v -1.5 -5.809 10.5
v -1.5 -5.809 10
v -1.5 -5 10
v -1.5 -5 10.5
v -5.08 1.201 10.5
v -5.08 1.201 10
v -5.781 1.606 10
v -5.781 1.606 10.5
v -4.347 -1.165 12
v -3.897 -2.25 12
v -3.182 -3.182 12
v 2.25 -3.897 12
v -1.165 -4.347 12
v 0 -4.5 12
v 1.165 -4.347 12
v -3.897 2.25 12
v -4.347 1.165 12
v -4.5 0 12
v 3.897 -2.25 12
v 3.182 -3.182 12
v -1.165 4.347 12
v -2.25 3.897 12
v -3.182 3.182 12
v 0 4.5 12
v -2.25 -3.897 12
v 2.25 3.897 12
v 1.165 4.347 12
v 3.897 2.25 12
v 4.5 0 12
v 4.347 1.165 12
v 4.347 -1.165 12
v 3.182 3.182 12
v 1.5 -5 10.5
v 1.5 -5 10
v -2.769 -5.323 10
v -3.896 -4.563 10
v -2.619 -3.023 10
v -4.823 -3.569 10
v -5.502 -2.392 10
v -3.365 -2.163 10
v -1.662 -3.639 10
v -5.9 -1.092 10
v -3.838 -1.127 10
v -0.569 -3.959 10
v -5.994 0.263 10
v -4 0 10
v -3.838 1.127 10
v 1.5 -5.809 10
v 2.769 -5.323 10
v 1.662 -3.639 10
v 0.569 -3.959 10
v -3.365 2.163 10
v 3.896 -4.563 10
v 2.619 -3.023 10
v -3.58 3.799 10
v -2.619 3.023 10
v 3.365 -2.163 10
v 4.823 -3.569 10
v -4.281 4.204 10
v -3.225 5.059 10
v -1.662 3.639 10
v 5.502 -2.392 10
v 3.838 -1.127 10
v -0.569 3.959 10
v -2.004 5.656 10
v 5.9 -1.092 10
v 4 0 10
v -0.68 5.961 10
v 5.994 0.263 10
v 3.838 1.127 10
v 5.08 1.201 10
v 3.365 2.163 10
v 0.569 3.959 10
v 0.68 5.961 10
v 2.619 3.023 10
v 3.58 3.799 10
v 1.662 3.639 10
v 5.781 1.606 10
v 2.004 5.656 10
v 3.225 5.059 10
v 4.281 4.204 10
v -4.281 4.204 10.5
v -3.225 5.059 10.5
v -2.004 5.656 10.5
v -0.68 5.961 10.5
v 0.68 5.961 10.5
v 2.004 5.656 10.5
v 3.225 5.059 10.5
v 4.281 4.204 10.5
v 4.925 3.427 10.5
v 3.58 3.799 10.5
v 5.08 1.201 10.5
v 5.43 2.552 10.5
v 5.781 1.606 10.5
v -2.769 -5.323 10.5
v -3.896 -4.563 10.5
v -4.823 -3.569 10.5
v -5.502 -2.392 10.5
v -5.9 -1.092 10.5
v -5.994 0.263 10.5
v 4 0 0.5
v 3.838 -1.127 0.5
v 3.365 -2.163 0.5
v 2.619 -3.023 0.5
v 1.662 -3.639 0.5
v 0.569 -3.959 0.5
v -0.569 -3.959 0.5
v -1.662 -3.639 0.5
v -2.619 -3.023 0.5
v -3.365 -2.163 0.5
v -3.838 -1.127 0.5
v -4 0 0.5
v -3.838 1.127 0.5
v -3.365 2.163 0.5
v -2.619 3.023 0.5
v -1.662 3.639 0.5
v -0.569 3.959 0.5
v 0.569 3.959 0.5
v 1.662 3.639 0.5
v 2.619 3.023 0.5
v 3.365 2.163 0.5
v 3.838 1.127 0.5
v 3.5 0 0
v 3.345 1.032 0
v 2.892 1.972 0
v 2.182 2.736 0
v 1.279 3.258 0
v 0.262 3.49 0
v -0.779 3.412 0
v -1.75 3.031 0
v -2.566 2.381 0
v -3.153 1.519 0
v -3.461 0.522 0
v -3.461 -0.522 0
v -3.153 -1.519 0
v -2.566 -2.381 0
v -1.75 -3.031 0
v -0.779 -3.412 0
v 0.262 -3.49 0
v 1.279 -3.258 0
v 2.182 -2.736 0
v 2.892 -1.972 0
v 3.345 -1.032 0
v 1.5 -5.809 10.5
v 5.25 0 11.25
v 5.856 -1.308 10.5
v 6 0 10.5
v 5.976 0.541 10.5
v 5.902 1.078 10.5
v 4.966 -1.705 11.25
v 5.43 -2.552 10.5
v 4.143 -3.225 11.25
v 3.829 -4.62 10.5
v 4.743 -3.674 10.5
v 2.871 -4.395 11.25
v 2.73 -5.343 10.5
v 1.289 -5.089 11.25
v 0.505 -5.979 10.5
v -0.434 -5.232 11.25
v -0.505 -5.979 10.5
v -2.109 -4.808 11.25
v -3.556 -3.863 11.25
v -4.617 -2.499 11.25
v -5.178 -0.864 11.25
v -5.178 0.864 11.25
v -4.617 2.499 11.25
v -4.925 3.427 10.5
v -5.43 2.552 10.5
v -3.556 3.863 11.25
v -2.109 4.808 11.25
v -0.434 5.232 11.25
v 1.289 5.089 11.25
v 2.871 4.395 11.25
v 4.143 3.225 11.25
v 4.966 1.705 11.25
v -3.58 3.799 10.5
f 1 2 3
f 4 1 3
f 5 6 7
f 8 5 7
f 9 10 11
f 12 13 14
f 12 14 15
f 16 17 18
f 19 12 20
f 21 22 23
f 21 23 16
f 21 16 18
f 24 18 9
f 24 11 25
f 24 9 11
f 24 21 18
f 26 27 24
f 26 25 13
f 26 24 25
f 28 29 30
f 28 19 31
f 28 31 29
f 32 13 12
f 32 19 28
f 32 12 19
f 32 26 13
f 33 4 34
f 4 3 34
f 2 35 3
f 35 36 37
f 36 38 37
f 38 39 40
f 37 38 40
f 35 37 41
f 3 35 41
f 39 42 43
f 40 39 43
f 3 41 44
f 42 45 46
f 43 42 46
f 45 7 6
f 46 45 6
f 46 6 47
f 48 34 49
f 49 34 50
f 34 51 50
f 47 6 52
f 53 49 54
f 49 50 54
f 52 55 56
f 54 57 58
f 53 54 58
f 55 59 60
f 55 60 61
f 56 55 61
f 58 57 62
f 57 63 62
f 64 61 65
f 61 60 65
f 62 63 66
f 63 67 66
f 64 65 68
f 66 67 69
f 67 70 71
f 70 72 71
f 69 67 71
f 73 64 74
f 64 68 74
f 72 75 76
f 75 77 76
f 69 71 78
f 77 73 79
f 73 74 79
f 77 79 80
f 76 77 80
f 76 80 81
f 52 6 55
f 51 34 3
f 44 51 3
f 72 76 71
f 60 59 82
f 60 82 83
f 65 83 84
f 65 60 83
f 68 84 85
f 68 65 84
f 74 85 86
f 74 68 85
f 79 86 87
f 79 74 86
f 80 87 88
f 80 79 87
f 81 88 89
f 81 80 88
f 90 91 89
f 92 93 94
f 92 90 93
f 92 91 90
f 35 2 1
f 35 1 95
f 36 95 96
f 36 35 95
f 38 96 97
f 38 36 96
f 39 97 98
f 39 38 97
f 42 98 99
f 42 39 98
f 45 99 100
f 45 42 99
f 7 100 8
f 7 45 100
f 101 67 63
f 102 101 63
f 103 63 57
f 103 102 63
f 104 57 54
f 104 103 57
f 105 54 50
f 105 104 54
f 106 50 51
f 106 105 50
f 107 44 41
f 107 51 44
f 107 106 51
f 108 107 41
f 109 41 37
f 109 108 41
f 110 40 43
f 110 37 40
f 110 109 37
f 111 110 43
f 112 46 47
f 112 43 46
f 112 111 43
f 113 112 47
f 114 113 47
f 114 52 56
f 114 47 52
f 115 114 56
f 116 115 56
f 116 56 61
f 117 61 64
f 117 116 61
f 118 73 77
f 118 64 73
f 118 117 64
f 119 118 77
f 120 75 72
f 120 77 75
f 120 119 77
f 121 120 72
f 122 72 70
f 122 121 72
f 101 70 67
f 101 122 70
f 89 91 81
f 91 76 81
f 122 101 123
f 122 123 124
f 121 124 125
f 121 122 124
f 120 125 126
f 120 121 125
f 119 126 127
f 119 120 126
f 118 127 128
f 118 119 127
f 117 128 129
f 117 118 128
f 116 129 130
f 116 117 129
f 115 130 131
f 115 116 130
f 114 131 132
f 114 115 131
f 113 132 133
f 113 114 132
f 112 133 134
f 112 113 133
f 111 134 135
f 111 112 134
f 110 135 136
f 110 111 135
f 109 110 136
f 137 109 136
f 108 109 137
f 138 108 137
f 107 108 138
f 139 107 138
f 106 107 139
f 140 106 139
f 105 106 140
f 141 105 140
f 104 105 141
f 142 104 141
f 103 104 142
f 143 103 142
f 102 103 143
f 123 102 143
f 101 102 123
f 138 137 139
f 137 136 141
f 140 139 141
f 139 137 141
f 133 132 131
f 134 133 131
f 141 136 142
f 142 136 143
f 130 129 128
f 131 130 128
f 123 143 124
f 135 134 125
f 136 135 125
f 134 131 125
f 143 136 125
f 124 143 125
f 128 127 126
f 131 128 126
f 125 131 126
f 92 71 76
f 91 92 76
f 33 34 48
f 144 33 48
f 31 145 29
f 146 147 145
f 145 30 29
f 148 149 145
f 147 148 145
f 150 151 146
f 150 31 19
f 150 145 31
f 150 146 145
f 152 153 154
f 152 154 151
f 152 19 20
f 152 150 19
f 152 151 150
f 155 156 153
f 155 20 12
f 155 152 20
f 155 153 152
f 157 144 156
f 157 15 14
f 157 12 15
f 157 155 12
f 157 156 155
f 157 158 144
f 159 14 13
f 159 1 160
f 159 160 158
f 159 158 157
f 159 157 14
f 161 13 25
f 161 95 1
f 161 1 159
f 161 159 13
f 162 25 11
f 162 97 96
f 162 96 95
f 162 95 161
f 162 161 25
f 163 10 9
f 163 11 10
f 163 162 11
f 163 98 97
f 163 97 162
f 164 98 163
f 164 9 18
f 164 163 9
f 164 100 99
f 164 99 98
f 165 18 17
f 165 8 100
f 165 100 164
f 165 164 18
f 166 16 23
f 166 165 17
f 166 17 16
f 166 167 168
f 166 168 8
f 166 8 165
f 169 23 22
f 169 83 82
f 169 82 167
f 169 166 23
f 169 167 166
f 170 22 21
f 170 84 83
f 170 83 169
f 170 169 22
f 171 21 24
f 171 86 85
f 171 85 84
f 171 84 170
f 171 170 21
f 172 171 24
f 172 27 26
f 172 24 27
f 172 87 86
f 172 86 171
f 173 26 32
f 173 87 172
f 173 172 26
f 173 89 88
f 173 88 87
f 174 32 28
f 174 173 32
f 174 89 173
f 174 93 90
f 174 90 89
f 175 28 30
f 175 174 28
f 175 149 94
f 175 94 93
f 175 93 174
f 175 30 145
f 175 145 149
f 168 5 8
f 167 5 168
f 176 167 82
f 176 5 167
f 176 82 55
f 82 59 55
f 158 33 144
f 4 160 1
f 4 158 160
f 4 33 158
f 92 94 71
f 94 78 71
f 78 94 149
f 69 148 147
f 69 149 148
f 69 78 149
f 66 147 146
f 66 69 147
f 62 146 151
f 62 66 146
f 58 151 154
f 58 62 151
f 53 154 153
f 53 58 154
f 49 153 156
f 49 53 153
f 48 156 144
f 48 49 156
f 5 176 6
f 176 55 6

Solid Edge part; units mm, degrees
sketch "Sketch1" plane through (0, 0, 0) normal (0, -1, 0) x (1, 0, 0)
  line L0 (0, 12) -> (6, 12)
  line L1 (6, 12) -> (6, 10)
  line L2 (6, 10) -> (4, 10)
  line L3 (4, 10) -> (4, 0)
  line L4 (4, 0) -> (0, 0)
  line L5 (0, 0) -> (0, 12)
revolve "RevolvedProtrusion1" add sketch "Sketch1" angle 360 about axis through (0, 0, 0) along (0, 0, 1)
chamfer "Chamfer1" distance 1.5 angle 45 1 edges at (-6, 0, 12)
chamfer "Chaflán_2" distance 0.5 angle 45 1 edges at (-4, 0, 0)
sketch "Sketch2" plane through (0, 0, 10) normal (0, 0, -1) x (1, 0, 0)
  line L0 (1.5, 7) -> (-1.5, 7)
  line L1 (-1.5, 7) -> (-1.5, 5)
  line L2 (-1.5, 5) -> (1.5, 5)
  line L3 (1.5, 5) -> (1.5, 7)
extrude "VaciadoExtruido_1" cut sketch "Sketch2" against normal blind 0.5
pattern_circular "Pattern1" count 3 over 360 about axis through (0, 0, 10) along (0, 0, -1) of "VaciadoExtruido_1"
